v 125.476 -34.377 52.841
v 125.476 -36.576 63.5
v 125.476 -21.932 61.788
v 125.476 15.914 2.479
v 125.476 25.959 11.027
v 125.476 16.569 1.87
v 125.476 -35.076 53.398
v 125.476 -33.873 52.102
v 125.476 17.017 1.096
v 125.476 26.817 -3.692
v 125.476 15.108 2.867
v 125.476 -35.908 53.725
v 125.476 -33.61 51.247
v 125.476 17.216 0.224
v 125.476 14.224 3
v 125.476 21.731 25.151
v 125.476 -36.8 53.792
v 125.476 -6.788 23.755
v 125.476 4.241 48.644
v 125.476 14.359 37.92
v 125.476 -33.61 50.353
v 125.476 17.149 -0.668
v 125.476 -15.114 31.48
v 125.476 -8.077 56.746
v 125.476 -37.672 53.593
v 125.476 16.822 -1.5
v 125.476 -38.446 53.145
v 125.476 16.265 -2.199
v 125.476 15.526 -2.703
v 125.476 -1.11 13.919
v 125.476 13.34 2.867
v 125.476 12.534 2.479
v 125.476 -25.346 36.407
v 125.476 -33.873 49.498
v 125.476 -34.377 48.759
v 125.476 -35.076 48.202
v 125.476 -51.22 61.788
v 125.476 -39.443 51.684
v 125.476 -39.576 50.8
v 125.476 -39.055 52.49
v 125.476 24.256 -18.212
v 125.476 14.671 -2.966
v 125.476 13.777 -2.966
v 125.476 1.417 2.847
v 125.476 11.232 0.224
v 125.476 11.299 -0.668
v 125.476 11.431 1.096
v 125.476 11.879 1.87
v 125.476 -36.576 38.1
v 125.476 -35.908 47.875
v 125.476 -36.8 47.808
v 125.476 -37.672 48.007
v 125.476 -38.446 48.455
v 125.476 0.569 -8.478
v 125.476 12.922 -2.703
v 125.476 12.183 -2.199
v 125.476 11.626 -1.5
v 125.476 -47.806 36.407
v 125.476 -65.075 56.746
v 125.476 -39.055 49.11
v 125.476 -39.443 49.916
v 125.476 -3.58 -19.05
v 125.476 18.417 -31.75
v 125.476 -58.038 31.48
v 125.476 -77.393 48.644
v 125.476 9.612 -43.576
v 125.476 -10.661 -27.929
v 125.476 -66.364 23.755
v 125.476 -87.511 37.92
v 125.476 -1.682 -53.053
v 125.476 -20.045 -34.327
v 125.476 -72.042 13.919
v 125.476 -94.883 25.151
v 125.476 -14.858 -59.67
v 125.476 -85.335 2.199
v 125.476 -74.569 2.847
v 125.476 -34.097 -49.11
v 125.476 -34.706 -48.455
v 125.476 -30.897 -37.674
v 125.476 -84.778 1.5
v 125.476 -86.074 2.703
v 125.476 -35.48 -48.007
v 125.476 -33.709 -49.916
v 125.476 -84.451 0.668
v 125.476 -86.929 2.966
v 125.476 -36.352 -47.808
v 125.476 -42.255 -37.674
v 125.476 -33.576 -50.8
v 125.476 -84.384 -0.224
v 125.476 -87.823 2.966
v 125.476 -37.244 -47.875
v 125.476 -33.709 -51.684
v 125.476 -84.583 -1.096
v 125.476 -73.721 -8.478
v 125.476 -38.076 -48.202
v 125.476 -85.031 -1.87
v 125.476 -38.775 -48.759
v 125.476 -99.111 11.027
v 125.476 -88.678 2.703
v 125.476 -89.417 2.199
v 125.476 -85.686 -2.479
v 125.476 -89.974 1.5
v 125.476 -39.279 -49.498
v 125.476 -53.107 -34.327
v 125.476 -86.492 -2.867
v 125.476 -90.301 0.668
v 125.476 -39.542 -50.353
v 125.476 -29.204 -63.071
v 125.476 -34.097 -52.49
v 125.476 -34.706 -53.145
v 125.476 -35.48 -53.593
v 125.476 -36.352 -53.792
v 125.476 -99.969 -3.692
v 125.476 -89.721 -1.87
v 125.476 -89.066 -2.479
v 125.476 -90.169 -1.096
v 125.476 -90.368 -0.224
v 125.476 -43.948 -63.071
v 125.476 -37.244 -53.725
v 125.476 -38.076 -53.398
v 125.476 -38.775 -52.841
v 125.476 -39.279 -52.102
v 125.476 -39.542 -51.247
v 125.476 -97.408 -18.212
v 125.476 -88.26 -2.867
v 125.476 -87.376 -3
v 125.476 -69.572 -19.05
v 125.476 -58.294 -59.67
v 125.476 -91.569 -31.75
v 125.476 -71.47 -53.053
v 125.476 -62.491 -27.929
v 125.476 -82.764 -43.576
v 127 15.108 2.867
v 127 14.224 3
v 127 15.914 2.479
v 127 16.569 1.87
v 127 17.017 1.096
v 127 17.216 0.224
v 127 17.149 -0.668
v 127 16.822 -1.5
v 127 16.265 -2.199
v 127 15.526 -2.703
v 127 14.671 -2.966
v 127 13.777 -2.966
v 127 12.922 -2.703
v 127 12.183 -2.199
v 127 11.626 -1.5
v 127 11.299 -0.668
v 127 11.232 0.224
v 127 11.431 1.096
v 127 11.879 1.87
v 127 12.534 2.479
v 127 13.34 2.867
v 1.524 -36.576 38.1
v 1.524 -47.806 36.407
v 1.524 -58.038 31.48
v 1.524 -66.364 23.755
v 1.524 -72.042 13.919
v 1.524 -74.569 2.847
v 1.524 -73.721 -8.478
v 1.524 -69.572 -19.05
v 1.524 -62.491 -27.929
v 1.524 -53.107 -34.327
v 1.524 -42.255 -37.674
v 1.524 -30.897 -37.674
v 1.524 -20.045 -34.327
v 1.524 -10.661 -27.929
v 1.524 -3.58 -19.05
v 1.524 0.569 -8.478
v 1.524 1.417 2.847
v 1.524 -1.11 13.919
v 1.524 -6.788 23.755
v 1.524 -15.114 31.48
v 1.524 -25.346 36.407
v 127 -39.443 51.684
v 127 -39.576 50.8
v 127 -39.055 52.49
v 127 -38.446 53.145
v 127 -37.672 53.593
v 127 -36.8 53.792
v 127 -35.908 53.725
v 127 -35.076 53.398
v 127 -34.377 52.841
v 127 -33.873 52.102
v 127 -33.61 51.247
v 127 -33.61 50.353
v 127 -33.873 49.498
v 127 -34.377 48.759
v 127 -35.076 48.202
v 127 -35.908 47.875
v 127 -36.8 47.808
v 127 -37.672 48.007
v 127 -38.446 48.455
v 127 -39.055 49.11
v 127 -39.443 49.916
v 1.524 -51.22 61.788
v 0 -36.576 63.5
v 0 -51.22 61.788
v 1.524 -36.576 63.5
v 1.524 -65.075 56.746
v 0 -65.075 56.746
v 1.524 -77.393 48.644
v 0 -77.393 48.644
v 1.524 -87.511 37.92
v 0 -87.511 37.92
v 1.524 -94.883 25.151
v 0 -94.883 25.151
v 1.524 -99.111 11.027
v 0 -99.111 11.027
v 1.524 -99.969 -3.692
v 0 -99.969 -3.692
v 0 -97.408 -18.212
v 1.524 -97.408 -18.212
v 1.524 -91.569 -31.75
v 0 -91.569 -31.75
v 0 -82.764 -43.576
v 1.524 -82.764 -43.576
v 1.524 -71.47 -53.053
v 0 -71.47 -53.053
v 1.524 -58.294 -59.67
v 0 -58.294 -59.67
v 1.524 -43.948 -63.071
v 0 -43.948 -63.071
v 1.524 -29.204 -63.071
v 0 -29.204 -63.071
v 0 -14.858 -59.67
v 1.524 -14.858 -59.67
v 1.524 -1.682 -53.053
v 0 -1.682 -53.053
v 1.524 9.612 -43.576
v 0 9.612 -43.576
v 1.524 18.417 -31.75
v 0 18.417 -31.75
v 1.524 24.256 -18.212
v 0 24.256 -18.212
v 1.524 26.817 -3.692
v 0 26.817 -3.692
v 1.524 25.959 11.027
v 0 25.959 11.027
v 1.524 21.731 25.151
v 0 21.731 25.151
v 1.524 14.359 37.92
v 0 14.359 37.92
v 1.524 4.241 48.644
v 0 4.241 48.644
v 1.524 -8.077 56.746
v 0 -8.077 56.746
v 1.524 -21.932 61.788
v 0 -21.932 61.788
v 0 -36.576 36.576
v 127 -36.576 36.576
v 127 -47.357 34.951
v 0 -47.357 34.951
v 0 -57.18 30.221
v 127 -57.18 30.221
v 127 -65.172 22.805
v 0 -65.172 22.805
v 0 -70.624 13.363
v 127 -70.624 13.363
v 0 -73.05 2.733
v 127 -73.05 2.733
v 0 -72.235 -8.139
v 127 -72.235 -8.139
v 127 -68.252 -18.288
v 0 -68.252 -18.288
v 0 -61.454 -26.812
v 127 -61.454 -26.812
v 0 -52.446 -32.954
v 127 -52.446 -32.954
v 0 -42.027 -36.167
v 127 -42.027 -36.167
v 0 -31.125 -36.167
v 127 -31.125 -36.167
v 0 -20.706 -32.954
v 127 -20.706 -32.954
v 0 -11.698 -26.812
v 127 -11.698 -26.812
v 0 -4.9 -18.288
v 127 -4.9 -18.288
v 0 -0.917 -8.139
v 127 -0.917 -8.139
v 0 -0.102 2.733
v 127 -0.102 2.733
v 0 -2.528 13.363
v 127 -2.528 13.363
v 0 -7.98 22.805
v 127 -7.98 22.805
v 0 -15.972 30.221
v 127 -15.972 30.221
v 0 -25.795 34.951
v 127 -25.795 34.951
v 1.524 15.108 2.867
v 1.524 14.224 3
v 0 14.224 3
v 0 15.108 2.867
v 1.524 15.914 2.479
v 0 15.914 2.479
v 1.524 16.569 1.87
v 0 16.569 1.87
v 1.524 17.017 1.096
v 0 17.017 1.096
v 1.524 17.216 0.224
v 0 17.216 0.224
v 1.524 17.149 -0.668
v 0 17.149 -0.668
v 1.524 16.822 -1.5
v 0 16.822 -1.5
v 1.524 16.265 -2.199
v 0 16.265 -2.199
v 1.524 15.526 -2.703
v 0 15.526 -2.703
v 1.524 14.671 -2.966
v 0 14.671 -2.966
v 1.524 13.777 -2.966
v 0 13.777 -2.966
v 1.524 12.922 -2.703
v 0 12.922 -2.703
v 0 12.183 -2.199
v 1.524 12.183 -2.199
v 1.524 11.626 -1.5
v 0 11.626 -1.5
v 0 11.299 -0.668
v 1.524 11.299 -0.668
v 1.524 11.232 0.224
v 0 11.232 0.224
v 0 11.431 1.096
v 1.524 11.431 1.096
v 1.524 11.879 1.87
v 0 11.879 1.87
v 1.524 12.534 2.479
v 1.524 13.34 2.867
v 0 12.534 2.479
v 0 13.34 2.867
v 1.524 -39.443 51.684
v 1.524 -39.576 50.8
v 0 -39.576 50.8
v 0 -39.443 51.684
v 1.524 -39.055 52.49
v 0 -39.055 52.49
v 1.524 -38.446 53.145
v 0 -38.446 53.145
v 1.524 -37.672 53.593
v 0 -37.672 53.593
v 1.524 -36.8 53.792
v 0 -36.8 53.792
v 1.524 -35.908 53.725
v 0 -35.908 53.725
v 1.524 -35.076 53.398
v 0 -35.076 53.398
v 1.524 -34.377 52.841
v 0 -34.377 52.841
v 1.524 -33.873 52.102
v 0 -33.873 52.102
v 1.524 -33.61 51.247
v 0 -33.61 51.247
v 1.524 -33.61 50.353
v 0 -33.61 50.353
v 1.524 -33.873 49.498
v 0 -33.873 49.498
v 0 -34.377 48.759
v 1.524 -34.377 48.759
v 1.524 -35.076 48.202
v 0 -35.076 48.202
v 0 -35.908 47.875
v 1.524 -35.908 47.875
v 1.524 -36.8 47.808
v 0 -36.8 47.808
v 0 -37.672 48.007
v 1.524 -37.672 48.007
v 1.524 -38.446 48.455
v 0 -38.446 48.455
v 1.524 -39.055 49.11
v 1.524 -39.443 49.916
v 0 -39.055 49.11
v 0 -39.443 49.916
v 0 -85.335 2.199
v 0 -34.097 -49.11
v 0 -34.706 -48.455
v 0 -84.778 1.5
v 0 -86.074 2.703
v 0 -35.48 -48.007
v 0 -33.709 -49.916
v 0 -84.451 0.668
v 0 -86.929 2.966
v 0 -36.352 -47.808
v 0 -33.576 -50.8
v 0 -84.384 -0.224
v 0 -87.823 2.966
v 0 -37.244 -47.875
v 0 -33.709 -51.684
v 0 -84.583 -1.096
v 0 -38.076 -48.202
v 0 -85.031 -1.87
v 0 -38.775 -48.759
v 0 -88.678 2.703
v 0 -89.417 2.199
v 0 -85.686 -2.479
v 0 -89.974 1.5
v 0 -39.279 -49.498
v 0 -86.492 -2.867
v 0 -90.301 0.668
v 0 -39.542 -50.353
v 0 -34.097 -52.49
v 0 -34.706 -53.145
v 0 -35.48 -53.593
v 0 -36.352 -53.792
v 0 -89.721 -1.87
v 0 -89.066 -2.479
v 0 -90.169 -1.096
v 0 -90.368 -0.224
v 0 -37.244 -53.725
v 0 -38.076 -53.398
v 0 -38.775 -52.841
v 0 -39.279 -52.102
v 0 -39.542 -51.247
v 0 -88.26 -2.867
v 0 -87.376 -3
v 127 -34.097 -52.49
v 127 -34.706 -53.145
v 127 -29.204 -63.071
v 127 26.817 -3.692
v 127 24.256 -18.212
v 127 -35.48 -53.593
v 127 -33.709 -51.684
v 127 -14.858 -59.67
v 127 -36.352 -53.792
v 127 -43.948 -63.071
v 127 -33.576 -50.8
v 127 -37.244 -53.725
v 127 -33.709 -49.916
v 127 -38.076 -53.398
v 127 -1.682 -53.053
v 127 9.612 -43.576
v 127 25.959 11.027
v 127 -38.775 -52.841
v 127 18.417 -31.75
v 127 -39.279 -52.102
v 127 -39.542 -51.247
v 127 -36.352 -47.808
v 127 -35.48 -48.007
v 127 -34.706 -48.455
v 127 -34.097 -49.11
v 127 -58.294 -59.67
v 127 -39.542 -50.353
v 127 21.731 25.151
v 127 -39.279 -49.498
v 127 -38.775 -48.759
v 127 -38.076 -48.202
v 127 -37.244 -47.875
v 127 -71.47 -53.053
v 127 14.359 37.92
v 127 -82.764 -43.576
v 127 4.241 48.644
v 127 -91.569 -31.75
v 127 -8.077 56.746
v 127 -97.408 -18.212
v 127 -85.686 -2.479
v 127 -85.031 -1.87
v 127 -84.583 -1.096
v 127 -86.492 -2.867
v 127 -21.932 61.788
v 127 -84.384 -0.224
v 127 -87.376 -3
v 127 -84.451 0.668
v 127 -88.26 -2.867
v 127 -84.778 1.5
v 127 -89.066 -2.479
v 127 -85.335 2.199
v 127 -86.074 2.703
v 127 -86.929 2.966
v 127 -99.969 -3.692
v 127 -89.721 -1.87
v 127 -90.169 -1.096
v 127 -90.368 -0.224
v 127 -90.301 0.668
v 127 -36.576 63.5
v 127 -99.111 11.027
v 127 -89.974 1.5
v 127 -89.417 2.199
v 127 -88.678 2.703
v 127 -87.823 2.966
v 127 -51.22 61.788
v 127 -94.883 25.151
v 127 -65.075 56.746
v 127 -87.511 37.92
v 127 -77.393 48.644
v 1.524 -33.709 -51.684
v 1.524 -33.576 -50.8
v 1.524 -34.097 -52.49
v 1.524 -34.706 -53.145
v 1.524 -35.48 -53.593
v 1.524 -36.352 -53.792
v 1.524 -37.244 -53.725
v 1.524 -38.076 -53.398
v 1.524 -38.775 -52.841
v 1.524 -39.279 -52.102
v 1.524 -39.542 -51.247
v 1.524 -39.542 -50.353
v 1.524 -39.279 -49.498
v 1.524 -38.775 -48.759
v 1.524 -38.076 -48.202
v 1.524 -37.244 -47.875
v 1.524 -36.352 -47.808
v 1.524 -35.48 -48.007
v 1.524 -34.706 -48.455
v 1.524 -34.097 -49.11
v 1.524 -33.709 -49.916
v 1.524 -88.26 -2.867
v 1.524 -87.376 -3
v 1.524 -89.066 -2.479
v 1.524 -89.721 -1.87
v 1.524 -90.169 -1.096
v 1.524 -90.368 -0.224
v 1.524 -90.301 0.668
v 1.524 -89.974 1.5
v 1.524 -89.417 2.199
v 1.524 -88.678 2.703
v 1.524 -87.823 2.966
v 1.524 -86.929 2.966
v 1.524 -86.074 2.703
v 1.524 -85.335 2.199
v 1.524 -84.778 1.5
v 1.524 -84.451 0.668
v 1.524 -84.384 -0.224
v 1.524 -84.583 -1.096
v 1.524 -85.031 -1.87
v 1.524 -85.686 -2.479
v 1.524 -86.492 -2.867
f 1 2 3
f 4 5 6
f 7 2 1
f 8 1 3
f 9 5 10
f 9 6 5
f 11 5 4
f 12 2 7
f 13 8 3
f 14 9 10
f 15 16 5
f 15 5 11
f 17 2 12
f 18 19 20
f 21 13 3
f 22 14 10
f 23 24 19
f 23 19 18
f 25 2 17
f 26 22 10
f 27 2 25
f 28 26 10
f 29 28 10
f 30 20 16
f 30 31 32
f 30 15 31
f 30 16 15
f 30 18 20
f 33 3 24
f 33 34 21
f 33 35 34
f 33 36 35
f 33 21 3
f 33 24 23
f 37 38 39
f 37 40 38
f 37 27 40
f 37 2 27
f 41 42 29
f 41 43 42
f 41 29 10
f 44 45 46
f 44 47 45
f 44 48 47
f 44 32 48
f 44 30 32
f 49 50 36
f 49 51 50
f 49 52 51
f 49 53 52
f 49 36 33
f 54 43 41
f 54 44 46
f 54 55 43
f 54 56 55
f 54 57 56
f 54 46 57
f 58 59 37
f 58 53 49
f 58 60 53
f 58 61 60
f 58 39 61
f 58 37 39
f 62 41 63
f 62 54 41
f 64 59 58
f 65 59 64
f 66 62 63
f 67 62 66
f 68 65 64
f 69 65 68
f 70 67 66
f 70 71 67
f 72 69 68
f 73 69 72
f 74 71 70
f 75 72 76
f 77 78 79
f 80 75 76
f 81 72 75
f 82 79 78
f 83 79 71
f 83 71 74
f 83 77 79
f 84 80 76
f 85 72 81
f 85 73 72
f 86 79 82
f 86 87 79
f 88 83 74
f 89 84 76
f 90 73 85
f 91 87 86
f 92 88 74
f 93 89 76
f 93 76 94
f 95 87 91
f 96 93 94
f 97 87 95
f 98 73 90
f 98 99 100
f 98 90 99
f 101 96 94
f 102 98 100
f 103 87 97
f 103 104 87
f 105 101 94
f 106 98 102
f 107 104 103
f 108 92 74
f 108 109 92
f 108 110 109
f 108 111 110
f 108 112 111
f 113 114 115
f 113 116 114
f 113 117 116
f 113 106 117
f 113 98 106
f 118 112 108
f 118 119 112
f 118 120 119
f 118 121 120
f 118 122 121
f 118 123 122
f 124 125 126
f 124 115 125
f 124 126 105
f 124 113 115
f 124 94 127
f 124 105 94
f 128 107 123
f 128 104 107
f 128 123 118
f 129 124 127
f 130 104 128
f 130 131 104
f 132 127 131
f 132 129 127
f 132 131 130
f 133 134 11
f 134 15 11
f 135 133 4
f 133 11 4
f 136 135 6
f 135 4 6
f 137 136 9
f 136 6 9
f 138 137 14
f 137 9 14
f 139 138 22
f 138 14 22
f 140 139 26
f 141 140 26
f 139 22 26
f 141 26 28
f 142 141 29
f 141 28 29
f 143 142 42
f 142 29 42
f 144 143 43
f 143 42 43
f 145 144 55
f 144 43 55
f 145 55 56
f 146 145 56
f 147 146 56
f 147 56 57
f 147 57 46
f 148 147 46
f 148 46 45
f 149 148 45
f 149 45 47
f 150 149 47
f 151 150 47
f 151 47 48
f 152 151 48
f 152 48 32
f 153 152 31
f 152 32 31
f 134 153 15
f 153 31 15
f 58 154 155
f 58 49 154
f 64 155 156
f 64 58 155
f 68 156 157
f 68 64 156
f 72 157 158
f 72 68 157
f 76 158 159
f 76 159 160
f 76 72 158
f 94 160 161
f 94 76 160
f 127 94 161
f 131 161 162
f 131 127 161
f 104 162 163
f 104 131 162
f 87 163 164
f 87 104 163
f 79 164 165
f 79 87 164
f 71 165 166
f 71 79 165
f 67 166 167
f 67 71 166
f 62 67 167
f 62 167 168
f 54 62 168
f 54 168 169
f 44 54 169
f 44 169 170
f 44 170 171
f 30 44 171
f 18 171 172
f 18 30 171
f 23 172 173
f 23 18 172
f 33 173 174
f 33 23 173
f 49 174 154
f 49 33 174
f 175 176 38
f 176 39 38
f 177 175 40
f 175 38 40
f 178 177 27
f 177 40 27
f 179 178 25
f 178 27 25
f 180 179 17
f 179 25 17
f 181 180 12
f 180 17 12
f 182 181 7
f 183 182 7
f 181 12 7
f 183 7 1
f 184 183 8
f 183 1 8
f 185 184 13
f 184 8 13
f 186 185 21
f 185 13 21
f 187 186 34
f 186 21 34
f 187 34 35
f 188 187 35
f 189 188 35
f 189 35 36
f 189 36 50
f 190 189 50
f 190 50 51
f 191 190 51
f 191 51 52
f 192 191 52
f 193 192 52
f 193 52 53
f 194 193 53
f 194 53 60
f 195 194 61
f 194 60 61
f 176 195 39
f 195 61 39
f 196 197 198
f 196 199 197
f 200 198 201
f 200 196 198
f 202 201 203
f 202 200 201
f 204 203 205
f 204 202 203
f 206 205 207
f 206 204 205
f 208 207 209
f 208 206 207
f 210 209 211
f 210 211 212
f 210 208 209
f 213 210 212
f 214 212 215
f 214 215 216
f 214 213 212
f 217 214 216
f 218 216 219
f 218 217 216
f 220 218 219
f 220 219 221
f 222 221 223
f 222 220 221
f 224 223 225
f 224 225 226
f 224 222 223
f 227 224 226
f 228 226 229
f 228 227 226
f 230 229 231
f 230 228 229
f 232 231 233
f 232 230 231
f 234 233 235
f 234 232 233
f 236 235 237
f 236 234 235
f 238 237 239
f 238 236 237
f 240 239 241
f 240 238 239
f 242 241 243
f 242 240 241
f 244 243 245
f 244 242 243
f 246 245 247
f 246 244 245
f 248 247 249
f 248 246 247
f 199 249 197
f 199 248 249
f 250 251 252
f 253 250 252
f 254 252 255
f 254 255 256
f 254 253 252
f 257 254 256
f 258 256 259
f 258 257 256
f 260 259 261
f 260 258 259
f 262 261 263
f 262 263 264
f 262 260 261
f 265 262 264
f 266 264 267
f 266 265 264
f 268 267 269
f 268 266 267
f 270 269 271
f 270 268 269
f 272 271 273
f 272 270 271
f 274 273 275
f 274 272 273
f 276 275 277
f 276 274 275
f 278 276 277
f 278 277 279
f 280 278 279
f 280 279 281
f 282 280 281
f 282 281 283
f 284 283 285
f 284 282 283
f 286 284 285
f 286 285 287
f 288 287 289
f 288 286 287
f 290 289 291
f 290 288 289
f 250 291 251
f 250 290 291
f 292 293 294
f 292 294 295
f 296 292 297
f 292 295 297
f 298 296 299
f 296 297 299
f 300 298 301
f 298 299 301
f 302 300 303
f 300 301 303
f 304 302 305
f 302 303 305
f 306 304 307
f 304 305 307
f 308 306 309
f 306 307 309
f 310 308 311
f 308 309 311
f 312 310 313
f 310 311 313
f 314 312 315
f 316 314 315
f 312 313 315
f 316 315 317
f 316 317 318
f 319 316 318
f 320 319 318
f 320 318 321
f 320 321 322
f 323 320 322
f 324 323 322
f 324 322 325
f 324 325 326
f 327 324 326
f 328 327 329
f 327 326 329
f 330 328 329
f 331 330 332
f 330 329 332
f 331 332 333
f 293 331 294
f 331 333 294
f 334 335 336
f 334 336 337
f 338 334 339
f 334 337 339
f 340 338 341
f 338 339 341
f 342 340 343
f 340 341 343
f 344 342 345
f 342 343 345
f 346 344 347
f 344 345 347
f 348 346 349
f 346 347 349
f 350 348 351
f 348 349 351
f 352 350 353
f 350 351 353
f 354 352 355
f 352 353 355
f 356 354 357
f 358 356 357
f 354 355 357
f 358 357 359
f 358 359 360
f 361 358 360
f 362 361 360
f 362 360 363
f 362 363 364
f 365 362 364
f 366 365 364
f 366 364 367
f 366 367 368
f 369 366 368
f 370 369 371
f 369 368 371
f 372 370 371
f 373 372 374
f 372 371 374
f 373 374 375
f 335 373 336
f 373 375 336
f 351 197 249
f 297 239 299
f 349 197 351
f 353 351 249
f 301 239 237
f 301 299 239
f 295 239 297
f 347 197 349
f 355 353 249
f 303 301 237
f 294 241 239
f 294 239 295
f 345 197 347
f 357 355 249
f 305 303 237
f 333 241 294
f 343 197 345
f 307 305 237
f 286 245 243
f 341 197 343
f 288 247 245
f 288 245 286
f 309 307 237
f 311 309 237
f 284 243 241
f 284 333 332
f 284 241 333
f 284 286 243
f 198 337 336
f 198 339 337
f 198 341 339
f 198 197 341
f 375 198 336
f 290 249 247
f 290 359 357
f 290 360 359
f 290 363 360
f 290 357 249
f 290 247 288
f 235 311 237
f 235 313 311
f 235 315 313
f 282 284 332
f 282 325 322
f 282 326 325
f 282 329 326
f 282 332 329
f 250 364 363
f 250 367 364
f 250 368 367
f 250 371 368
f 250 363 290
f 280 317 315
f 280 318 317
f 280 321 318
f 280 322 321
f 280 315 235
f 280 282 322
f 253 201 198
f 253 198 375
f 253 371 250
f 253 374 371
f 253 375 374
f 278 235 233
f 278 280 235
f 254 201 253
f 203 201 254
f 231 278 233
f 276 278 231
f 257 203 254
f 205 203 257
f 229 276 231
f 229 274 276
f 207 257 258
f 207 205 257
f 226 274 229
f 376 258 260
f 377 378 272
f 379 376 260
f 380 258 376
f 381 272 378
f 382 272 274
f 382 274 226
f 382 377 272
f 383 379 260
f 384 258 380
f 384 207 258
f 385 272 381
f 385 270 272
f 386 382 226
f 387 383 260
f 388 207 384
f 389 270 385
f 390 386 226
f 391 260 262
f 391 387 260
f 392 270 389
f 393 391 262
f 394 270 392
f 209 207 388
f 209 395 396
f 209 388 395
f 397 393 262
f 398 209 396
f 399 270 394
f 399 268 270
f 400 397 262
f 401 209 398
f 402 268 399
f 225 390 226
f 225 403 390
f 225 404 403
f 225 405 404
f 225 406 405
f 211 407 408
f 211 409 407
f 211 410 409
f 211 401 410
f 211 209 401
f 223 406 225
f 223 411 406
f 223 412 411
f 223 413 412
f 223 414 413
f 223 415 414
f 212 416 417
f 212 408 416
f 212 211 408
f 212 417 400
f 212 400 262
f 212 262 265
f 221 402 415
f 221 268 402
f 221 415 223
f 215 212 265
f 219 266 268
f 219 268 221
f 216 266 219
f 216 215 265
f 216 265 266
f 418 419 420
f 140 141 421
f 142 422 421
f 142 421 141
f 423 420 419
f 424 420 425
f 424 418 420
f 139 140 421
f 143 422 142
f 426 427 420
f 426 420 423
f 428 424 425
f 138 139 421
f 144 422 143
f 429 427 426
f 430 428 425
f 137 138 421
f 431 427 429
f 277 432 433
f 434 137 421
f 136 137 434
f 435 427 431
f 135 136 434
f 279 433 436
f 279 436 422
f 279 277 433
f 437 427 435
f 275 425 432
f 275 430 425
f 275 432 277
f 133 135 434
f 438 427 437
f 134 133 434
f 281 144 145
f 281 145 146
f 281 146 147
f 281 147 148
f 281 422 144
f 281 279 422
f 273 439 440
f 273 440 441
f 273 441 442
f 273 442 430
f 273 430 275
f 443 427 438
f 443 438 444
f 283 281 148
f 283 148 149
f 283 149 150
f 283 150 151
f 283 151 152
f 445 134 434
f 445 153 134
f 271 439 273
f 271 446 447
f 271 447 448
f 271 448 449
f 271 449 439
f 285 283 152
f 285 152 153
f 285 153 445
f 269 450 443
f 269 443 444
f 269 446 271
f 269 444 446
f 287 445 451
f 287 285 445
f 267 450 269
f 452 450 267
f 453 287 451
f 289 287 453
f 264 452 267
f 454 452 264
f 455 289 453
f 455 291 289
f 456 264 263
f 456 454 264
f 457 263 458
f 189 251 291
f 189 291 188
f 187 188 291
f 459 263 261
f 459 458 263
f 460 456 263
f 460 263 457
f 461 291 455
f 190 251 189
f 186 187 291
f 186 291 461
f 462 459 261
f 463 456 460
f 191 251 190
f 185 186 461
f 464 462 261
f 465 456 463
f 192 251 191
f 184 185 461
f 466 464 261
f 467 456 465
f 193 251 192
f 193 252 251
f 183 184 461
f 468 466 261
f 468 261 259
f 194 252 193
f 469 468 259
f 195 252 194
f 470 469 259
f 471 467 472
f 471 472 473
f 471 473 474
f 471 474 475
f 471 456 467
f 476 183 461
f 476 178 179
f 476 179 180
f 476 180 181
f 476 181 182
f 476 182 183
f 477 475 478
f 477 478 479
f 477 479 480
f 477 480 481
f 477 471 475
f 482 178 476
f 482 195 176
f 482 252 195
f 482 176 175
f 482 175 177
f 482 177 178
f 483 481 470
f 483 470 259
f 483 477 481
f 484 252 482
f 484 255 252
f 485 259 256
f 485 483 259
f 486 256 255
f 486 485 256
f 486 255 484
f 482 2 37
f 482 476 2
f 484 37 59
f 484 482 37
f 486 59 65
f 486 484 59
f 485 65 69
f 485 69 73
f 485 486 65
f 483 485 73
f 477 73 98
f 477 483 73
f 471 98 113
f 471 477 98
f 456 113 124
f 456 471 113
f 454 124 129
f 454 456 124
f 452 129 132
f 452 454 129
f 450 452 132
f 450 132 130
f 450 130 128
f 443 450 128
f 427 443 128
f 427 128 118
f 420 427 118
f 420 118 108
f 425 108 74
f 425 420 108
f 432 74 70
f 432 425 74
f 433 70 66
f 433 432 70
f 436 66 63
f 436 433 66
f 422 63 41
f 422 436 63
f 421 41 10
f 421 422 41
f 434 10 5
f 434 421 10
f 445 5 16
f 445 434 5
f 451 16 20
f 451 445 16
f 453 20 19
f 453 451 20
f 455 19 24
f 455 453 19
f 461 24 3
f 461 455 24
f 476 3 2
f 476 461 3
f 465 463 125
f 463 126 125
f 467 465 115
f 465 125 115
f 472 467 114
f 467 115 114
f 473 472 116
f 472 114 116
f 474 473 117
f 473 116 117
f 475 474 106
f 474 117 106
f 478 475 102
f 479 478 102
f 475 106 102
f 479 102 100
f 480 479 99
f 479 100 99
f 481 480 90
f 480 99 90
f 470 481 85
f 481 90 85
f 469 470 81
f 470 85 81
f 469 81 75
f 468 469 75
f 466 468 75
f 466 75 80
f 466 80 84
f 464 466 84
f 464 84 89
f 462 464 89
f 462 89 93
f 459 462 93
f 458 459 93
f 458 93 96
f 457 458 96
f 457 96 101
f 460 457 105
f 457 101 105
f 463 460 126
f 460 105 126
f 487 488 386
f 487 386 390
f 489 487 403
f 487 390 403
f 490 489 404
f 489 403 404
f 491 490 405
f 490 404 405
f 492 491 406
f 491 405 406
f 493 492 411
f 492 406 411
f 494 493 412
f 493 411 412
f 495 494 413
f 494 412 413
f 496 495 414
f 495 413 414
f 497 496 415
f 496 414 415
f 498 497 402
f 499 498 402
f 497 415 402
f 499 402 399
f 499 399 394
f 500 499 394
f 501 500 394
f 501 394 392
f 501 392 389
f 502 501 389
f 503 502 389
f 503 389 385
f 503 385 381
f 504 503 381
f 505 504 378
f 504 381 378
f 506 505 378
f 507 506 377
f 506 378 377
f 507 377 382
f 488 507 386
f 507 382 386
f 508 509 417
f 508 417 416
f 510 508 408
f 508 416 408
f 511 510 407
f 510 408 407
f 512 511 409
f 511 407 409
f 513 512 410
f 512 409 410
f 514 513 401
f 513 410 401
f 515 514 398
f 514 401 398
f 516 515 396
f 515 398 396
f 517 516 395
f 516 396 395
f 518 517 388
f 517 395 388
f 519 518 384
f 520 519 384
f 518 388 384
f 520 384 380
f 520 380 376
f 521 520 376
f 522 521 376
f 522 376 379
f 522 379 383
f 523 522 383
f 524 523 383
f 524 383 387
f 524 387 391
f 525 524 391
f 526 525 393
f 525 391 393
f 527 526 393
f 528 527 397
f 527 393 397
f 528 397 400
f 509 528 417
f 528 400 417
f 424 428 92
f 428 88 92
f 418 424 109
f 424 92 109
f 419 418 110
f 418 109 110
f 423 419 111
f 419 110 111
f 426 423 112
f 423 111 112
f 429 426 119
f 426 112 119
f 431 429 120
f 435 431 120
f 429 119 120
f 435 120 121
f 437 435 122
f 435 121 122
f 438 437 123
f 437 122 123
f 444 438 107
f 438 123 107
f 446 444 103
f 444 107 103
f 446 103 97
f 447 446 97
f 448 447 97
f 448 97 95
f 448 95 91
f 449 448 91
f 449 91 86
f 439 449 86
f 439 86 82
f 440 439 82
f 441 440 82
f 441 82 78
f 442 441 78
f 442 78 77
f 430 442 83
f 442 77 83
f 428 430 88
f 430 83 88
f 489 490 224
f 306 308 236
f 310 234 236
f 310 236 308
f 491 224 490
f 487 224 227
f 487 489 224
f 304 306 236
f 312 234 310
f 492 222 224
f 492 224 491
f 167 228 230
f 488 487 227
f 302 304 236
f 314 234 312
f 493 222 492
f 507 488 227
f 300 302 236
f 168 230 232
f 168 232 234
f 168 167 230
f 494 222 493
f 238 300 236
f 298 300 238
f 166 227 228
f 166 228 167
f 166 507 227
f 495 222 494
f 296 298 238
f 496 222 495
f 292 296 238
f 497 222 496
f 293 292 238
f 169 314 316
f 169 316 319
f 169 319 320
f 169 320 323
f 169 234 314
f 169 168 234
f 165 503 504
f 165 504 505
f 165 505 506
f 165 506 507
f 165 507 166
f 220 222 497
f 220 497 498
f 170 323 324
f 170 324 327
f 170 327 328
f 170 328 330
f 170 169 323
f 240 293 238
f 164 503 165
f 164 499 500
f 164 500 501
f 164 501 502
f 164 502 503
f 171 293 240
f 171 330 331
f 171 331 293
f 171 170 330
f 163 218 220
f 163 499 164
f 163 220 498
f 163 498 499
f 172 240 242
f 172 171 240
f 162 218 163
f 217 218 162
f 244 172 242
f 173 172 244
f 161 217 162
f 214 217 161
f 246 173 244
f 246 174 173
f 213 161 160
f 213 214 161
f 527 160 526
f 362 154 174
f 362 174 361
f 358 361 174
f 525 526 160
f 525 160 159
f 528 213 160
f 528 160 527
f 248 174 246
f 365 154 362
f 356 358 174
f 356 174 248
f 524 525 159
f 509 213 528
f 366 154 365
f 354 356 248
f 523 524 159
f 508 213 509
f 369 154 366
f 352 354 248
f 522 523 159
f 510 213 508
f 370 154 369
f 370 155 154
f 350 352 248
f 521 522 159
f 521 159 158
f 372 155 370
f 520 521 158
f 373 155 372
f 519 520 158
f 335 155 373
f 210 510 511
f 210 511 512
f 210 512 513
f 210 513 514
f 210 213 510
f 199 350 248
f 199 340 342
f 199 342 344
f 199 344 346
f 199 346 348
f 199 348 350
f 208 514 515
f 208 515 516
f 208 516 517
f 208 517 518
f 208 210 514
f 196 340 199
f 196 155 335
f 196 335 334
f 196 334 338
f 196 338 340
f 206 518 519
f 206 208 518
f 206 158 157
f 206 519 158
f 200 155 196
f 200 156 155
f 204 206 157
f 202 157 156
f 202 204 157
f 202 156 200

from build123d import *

# Parameters (mm, degrees)
SKETCH4_R          = 3
CUT_EXTRUDE1_DEPTH = 174.713717869
CIRPATTERN1_COUNT  = 4


with BuildPart() as part:
    # Sketch3 → Revolve1 (revolve)
    with BuildSketch(Plane.XY, mode=Mode.PRIVATE) as revolve1_sk:
        Polygon((0, 0), (0, 26.924), (1.524, 26.924), (1.524, 1.524), (125.476, 1.524), (125.476, 26.924), (127, 26.924), (127, 0), align=None)
    revolve(revolve1_sk.sketch.rotate(Axis((-7.37458194, -36.576, 0), (1, 0, 0)), 90), axis=Axis((-7.37458194, -36.576, 0), (1, 0, 0)))

    # Sketch4 → Cut-Extrude1 (cut, symmetric)
    with BuildSketch(Plane.ZY):
        with Locations((0, 14.224)):
            Circle(SKETCH4_R)
    cut_extrude1 = extrude(amount=CUT_EXTRUDE1_DEPTH, both=True, mode=Mode.SUBTRACT)

    # CirPattern1: Cut-Extrude1 ×4 about axis
    cirpattern1_axis = Axis((0, -36.576, 0), (1, 0, 0))
    for i in range(1, CIRPATTERN1_COUNT):
        add(cut_extrude1.rotate(cirpattern1_axis, i * 360 / CIRPATTERN1_COUNT), mode=Mode.SUBTRACT)


solid = part.part
